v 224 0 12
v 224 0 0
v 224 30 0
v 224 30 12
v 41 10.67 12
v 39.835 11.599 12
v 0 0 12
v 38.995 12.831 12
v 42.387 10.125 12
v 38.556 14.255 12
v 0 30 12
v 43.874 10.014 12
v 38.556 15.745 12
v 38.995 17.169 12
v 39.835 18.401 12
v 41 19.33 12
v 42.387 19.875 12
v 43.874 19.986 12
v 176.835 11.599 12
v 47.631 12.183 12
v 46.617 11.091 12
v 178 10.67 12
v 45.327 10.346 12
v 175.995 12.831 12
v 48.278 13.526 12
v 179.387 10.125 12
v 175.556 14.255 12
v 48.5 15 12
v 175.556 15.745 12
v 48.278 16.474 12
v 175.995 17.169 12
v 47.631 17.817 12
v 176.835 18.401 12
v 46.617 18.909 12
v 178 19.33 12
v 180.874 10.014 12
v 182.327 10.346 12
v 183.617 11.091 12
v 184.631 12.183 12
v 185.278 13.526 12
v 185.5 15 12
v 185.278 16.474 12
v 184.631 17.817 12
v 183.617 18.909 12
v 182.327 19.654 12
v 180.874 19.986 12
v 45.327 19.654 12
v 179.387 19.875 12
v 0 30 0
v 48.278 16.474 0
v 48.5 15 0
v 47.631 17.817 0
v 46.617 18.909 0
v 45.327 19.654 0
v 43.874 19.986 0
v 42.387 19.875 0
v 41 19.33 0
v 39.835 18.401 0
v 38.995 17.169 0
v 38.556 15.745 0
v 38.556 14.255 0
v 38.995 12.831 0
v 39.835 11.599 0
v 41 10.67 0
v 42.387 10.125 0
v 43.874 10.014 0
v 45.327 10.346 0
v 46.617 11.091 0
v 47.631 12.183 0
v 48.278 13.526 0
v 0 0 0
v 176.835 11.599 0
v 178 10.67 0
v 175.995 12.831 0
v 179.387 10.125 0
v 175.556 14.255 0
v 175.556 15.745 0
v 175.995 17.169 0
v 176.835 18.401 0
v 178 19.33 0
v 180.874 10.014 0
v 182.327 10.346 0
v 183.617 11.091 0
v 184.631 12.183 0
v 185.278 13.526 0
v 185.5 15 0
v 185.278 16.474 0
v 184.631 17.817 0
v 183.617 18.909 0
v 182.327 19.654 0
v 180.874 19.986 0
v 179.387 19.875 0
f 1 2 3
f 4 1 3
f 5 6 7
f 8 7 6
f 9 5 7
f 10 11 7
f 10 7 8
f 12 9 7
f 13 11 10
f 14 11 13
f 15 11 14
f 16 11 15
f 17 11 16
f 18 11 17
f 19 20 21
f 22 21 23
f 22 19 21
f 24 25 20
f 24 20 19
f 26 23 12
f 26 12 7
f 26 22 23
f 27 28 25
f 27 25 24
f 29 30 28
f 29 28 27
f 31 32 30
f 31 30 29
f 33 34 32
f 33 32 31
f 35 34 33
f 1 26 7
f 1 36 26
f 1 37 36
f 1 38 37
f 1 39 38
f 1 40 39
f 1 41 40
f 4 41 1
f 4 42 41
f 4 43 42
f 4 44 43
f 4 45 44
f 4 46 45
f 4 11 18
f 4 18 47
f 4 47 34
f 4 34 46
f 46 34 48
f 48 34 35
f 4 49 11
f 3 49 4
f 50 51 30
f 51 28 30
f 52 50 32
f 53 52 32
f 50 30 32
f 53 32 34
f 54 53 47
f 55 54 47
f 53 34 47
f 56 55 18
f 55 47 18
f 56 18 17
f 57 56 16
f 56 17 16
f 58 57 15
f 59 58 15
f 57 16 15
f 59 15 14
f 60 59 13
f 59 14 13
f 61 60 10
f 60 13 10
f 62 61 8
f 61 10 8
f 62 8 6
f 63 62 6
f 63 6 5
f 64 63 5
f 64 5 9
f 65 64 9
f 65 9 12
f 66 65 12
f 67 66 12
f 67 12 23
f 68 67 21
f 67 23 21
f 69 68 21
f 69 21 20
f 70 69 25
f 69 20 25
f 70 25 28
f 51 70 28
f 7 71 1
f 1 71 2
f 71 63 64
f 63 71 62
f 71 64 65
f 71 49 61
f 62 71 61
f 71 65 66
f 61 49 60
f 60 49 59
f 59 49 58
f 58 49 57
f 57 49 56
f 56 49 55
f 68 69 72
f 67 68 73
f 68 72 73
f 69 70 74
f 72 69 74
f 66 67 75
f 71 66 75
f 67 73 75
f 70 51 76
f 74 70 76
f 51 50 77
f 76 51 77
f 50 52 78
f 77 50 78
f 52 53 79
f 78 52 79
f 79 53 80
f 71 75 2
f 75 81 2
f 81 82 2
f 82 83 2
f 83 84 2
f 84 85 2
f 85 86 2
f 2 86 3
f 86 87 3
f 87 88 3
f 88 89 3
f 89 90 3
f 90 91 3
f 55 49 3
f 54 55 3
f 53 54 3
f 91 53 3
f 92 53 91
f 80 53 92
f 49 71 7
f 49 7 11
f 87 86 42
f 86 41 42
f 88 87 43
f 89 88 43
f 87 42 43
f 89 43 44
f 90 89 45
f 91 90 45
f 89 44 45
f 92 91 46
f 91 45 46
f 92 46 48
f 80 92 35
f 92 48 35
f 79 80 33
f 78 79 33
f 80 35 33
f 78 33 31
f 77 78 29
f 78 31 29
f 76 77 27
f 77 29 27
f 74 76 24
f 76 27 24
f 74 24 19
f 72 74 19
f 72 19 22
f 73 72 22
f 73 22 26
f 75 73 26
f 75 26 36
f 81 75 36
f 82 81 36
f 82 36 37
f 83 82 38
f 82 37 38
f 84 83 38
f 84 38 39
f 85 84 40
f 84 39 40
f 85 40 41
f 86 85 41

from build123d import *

# Parameters (mm, degrees)
SKETCH_1_W             = 224
SKETCH_1_H             = 30
EXTRUDE_1_DEPTH        = 12
SKETCH_4_R             = 5
CUT_EXTRUDE_1_DEPTH    = 227.318359839
PATTERN_LINEAR_1_COUNT = 2
PATTERN_LINEAR_1_PITCH = 137


with BuildPart() as part:
    # Sketch 1 → Бобышка-Вытянуть1 (new body)
    with BuildSketch(Plane.XY):
        with Locations((112, 15)):
            Rectangle(SKETCH_1_W, SKETCH_1_H)
    extrude(amount=EXTRUDE_1_DEPTH)

    # Эскиз4 → Вырез-Вытянуть1 (cut, symmetric)
    with BuildSketch(Plane.XY.offset(12)):
        with Locations((43.5, 15)):
            Circle(SKETCH_4_R)
    cut_extrude_1 = extrude(amount=CUT_EXTRUDE_1_DEPTH, both=True, mode=Mode.SUBTRACT)

    # Линейный массив1: Вырез-Вытянуть1 ×2
    with Locations(*[(i * PATTERN_LINEAR_1_PITCH, 0, 0) for i in range(1, PATTERN_LINEAR_1_COUNT)]):
        add(cut_extrude_1, mode=Mode.SUBTRACT)


solid = part.part
